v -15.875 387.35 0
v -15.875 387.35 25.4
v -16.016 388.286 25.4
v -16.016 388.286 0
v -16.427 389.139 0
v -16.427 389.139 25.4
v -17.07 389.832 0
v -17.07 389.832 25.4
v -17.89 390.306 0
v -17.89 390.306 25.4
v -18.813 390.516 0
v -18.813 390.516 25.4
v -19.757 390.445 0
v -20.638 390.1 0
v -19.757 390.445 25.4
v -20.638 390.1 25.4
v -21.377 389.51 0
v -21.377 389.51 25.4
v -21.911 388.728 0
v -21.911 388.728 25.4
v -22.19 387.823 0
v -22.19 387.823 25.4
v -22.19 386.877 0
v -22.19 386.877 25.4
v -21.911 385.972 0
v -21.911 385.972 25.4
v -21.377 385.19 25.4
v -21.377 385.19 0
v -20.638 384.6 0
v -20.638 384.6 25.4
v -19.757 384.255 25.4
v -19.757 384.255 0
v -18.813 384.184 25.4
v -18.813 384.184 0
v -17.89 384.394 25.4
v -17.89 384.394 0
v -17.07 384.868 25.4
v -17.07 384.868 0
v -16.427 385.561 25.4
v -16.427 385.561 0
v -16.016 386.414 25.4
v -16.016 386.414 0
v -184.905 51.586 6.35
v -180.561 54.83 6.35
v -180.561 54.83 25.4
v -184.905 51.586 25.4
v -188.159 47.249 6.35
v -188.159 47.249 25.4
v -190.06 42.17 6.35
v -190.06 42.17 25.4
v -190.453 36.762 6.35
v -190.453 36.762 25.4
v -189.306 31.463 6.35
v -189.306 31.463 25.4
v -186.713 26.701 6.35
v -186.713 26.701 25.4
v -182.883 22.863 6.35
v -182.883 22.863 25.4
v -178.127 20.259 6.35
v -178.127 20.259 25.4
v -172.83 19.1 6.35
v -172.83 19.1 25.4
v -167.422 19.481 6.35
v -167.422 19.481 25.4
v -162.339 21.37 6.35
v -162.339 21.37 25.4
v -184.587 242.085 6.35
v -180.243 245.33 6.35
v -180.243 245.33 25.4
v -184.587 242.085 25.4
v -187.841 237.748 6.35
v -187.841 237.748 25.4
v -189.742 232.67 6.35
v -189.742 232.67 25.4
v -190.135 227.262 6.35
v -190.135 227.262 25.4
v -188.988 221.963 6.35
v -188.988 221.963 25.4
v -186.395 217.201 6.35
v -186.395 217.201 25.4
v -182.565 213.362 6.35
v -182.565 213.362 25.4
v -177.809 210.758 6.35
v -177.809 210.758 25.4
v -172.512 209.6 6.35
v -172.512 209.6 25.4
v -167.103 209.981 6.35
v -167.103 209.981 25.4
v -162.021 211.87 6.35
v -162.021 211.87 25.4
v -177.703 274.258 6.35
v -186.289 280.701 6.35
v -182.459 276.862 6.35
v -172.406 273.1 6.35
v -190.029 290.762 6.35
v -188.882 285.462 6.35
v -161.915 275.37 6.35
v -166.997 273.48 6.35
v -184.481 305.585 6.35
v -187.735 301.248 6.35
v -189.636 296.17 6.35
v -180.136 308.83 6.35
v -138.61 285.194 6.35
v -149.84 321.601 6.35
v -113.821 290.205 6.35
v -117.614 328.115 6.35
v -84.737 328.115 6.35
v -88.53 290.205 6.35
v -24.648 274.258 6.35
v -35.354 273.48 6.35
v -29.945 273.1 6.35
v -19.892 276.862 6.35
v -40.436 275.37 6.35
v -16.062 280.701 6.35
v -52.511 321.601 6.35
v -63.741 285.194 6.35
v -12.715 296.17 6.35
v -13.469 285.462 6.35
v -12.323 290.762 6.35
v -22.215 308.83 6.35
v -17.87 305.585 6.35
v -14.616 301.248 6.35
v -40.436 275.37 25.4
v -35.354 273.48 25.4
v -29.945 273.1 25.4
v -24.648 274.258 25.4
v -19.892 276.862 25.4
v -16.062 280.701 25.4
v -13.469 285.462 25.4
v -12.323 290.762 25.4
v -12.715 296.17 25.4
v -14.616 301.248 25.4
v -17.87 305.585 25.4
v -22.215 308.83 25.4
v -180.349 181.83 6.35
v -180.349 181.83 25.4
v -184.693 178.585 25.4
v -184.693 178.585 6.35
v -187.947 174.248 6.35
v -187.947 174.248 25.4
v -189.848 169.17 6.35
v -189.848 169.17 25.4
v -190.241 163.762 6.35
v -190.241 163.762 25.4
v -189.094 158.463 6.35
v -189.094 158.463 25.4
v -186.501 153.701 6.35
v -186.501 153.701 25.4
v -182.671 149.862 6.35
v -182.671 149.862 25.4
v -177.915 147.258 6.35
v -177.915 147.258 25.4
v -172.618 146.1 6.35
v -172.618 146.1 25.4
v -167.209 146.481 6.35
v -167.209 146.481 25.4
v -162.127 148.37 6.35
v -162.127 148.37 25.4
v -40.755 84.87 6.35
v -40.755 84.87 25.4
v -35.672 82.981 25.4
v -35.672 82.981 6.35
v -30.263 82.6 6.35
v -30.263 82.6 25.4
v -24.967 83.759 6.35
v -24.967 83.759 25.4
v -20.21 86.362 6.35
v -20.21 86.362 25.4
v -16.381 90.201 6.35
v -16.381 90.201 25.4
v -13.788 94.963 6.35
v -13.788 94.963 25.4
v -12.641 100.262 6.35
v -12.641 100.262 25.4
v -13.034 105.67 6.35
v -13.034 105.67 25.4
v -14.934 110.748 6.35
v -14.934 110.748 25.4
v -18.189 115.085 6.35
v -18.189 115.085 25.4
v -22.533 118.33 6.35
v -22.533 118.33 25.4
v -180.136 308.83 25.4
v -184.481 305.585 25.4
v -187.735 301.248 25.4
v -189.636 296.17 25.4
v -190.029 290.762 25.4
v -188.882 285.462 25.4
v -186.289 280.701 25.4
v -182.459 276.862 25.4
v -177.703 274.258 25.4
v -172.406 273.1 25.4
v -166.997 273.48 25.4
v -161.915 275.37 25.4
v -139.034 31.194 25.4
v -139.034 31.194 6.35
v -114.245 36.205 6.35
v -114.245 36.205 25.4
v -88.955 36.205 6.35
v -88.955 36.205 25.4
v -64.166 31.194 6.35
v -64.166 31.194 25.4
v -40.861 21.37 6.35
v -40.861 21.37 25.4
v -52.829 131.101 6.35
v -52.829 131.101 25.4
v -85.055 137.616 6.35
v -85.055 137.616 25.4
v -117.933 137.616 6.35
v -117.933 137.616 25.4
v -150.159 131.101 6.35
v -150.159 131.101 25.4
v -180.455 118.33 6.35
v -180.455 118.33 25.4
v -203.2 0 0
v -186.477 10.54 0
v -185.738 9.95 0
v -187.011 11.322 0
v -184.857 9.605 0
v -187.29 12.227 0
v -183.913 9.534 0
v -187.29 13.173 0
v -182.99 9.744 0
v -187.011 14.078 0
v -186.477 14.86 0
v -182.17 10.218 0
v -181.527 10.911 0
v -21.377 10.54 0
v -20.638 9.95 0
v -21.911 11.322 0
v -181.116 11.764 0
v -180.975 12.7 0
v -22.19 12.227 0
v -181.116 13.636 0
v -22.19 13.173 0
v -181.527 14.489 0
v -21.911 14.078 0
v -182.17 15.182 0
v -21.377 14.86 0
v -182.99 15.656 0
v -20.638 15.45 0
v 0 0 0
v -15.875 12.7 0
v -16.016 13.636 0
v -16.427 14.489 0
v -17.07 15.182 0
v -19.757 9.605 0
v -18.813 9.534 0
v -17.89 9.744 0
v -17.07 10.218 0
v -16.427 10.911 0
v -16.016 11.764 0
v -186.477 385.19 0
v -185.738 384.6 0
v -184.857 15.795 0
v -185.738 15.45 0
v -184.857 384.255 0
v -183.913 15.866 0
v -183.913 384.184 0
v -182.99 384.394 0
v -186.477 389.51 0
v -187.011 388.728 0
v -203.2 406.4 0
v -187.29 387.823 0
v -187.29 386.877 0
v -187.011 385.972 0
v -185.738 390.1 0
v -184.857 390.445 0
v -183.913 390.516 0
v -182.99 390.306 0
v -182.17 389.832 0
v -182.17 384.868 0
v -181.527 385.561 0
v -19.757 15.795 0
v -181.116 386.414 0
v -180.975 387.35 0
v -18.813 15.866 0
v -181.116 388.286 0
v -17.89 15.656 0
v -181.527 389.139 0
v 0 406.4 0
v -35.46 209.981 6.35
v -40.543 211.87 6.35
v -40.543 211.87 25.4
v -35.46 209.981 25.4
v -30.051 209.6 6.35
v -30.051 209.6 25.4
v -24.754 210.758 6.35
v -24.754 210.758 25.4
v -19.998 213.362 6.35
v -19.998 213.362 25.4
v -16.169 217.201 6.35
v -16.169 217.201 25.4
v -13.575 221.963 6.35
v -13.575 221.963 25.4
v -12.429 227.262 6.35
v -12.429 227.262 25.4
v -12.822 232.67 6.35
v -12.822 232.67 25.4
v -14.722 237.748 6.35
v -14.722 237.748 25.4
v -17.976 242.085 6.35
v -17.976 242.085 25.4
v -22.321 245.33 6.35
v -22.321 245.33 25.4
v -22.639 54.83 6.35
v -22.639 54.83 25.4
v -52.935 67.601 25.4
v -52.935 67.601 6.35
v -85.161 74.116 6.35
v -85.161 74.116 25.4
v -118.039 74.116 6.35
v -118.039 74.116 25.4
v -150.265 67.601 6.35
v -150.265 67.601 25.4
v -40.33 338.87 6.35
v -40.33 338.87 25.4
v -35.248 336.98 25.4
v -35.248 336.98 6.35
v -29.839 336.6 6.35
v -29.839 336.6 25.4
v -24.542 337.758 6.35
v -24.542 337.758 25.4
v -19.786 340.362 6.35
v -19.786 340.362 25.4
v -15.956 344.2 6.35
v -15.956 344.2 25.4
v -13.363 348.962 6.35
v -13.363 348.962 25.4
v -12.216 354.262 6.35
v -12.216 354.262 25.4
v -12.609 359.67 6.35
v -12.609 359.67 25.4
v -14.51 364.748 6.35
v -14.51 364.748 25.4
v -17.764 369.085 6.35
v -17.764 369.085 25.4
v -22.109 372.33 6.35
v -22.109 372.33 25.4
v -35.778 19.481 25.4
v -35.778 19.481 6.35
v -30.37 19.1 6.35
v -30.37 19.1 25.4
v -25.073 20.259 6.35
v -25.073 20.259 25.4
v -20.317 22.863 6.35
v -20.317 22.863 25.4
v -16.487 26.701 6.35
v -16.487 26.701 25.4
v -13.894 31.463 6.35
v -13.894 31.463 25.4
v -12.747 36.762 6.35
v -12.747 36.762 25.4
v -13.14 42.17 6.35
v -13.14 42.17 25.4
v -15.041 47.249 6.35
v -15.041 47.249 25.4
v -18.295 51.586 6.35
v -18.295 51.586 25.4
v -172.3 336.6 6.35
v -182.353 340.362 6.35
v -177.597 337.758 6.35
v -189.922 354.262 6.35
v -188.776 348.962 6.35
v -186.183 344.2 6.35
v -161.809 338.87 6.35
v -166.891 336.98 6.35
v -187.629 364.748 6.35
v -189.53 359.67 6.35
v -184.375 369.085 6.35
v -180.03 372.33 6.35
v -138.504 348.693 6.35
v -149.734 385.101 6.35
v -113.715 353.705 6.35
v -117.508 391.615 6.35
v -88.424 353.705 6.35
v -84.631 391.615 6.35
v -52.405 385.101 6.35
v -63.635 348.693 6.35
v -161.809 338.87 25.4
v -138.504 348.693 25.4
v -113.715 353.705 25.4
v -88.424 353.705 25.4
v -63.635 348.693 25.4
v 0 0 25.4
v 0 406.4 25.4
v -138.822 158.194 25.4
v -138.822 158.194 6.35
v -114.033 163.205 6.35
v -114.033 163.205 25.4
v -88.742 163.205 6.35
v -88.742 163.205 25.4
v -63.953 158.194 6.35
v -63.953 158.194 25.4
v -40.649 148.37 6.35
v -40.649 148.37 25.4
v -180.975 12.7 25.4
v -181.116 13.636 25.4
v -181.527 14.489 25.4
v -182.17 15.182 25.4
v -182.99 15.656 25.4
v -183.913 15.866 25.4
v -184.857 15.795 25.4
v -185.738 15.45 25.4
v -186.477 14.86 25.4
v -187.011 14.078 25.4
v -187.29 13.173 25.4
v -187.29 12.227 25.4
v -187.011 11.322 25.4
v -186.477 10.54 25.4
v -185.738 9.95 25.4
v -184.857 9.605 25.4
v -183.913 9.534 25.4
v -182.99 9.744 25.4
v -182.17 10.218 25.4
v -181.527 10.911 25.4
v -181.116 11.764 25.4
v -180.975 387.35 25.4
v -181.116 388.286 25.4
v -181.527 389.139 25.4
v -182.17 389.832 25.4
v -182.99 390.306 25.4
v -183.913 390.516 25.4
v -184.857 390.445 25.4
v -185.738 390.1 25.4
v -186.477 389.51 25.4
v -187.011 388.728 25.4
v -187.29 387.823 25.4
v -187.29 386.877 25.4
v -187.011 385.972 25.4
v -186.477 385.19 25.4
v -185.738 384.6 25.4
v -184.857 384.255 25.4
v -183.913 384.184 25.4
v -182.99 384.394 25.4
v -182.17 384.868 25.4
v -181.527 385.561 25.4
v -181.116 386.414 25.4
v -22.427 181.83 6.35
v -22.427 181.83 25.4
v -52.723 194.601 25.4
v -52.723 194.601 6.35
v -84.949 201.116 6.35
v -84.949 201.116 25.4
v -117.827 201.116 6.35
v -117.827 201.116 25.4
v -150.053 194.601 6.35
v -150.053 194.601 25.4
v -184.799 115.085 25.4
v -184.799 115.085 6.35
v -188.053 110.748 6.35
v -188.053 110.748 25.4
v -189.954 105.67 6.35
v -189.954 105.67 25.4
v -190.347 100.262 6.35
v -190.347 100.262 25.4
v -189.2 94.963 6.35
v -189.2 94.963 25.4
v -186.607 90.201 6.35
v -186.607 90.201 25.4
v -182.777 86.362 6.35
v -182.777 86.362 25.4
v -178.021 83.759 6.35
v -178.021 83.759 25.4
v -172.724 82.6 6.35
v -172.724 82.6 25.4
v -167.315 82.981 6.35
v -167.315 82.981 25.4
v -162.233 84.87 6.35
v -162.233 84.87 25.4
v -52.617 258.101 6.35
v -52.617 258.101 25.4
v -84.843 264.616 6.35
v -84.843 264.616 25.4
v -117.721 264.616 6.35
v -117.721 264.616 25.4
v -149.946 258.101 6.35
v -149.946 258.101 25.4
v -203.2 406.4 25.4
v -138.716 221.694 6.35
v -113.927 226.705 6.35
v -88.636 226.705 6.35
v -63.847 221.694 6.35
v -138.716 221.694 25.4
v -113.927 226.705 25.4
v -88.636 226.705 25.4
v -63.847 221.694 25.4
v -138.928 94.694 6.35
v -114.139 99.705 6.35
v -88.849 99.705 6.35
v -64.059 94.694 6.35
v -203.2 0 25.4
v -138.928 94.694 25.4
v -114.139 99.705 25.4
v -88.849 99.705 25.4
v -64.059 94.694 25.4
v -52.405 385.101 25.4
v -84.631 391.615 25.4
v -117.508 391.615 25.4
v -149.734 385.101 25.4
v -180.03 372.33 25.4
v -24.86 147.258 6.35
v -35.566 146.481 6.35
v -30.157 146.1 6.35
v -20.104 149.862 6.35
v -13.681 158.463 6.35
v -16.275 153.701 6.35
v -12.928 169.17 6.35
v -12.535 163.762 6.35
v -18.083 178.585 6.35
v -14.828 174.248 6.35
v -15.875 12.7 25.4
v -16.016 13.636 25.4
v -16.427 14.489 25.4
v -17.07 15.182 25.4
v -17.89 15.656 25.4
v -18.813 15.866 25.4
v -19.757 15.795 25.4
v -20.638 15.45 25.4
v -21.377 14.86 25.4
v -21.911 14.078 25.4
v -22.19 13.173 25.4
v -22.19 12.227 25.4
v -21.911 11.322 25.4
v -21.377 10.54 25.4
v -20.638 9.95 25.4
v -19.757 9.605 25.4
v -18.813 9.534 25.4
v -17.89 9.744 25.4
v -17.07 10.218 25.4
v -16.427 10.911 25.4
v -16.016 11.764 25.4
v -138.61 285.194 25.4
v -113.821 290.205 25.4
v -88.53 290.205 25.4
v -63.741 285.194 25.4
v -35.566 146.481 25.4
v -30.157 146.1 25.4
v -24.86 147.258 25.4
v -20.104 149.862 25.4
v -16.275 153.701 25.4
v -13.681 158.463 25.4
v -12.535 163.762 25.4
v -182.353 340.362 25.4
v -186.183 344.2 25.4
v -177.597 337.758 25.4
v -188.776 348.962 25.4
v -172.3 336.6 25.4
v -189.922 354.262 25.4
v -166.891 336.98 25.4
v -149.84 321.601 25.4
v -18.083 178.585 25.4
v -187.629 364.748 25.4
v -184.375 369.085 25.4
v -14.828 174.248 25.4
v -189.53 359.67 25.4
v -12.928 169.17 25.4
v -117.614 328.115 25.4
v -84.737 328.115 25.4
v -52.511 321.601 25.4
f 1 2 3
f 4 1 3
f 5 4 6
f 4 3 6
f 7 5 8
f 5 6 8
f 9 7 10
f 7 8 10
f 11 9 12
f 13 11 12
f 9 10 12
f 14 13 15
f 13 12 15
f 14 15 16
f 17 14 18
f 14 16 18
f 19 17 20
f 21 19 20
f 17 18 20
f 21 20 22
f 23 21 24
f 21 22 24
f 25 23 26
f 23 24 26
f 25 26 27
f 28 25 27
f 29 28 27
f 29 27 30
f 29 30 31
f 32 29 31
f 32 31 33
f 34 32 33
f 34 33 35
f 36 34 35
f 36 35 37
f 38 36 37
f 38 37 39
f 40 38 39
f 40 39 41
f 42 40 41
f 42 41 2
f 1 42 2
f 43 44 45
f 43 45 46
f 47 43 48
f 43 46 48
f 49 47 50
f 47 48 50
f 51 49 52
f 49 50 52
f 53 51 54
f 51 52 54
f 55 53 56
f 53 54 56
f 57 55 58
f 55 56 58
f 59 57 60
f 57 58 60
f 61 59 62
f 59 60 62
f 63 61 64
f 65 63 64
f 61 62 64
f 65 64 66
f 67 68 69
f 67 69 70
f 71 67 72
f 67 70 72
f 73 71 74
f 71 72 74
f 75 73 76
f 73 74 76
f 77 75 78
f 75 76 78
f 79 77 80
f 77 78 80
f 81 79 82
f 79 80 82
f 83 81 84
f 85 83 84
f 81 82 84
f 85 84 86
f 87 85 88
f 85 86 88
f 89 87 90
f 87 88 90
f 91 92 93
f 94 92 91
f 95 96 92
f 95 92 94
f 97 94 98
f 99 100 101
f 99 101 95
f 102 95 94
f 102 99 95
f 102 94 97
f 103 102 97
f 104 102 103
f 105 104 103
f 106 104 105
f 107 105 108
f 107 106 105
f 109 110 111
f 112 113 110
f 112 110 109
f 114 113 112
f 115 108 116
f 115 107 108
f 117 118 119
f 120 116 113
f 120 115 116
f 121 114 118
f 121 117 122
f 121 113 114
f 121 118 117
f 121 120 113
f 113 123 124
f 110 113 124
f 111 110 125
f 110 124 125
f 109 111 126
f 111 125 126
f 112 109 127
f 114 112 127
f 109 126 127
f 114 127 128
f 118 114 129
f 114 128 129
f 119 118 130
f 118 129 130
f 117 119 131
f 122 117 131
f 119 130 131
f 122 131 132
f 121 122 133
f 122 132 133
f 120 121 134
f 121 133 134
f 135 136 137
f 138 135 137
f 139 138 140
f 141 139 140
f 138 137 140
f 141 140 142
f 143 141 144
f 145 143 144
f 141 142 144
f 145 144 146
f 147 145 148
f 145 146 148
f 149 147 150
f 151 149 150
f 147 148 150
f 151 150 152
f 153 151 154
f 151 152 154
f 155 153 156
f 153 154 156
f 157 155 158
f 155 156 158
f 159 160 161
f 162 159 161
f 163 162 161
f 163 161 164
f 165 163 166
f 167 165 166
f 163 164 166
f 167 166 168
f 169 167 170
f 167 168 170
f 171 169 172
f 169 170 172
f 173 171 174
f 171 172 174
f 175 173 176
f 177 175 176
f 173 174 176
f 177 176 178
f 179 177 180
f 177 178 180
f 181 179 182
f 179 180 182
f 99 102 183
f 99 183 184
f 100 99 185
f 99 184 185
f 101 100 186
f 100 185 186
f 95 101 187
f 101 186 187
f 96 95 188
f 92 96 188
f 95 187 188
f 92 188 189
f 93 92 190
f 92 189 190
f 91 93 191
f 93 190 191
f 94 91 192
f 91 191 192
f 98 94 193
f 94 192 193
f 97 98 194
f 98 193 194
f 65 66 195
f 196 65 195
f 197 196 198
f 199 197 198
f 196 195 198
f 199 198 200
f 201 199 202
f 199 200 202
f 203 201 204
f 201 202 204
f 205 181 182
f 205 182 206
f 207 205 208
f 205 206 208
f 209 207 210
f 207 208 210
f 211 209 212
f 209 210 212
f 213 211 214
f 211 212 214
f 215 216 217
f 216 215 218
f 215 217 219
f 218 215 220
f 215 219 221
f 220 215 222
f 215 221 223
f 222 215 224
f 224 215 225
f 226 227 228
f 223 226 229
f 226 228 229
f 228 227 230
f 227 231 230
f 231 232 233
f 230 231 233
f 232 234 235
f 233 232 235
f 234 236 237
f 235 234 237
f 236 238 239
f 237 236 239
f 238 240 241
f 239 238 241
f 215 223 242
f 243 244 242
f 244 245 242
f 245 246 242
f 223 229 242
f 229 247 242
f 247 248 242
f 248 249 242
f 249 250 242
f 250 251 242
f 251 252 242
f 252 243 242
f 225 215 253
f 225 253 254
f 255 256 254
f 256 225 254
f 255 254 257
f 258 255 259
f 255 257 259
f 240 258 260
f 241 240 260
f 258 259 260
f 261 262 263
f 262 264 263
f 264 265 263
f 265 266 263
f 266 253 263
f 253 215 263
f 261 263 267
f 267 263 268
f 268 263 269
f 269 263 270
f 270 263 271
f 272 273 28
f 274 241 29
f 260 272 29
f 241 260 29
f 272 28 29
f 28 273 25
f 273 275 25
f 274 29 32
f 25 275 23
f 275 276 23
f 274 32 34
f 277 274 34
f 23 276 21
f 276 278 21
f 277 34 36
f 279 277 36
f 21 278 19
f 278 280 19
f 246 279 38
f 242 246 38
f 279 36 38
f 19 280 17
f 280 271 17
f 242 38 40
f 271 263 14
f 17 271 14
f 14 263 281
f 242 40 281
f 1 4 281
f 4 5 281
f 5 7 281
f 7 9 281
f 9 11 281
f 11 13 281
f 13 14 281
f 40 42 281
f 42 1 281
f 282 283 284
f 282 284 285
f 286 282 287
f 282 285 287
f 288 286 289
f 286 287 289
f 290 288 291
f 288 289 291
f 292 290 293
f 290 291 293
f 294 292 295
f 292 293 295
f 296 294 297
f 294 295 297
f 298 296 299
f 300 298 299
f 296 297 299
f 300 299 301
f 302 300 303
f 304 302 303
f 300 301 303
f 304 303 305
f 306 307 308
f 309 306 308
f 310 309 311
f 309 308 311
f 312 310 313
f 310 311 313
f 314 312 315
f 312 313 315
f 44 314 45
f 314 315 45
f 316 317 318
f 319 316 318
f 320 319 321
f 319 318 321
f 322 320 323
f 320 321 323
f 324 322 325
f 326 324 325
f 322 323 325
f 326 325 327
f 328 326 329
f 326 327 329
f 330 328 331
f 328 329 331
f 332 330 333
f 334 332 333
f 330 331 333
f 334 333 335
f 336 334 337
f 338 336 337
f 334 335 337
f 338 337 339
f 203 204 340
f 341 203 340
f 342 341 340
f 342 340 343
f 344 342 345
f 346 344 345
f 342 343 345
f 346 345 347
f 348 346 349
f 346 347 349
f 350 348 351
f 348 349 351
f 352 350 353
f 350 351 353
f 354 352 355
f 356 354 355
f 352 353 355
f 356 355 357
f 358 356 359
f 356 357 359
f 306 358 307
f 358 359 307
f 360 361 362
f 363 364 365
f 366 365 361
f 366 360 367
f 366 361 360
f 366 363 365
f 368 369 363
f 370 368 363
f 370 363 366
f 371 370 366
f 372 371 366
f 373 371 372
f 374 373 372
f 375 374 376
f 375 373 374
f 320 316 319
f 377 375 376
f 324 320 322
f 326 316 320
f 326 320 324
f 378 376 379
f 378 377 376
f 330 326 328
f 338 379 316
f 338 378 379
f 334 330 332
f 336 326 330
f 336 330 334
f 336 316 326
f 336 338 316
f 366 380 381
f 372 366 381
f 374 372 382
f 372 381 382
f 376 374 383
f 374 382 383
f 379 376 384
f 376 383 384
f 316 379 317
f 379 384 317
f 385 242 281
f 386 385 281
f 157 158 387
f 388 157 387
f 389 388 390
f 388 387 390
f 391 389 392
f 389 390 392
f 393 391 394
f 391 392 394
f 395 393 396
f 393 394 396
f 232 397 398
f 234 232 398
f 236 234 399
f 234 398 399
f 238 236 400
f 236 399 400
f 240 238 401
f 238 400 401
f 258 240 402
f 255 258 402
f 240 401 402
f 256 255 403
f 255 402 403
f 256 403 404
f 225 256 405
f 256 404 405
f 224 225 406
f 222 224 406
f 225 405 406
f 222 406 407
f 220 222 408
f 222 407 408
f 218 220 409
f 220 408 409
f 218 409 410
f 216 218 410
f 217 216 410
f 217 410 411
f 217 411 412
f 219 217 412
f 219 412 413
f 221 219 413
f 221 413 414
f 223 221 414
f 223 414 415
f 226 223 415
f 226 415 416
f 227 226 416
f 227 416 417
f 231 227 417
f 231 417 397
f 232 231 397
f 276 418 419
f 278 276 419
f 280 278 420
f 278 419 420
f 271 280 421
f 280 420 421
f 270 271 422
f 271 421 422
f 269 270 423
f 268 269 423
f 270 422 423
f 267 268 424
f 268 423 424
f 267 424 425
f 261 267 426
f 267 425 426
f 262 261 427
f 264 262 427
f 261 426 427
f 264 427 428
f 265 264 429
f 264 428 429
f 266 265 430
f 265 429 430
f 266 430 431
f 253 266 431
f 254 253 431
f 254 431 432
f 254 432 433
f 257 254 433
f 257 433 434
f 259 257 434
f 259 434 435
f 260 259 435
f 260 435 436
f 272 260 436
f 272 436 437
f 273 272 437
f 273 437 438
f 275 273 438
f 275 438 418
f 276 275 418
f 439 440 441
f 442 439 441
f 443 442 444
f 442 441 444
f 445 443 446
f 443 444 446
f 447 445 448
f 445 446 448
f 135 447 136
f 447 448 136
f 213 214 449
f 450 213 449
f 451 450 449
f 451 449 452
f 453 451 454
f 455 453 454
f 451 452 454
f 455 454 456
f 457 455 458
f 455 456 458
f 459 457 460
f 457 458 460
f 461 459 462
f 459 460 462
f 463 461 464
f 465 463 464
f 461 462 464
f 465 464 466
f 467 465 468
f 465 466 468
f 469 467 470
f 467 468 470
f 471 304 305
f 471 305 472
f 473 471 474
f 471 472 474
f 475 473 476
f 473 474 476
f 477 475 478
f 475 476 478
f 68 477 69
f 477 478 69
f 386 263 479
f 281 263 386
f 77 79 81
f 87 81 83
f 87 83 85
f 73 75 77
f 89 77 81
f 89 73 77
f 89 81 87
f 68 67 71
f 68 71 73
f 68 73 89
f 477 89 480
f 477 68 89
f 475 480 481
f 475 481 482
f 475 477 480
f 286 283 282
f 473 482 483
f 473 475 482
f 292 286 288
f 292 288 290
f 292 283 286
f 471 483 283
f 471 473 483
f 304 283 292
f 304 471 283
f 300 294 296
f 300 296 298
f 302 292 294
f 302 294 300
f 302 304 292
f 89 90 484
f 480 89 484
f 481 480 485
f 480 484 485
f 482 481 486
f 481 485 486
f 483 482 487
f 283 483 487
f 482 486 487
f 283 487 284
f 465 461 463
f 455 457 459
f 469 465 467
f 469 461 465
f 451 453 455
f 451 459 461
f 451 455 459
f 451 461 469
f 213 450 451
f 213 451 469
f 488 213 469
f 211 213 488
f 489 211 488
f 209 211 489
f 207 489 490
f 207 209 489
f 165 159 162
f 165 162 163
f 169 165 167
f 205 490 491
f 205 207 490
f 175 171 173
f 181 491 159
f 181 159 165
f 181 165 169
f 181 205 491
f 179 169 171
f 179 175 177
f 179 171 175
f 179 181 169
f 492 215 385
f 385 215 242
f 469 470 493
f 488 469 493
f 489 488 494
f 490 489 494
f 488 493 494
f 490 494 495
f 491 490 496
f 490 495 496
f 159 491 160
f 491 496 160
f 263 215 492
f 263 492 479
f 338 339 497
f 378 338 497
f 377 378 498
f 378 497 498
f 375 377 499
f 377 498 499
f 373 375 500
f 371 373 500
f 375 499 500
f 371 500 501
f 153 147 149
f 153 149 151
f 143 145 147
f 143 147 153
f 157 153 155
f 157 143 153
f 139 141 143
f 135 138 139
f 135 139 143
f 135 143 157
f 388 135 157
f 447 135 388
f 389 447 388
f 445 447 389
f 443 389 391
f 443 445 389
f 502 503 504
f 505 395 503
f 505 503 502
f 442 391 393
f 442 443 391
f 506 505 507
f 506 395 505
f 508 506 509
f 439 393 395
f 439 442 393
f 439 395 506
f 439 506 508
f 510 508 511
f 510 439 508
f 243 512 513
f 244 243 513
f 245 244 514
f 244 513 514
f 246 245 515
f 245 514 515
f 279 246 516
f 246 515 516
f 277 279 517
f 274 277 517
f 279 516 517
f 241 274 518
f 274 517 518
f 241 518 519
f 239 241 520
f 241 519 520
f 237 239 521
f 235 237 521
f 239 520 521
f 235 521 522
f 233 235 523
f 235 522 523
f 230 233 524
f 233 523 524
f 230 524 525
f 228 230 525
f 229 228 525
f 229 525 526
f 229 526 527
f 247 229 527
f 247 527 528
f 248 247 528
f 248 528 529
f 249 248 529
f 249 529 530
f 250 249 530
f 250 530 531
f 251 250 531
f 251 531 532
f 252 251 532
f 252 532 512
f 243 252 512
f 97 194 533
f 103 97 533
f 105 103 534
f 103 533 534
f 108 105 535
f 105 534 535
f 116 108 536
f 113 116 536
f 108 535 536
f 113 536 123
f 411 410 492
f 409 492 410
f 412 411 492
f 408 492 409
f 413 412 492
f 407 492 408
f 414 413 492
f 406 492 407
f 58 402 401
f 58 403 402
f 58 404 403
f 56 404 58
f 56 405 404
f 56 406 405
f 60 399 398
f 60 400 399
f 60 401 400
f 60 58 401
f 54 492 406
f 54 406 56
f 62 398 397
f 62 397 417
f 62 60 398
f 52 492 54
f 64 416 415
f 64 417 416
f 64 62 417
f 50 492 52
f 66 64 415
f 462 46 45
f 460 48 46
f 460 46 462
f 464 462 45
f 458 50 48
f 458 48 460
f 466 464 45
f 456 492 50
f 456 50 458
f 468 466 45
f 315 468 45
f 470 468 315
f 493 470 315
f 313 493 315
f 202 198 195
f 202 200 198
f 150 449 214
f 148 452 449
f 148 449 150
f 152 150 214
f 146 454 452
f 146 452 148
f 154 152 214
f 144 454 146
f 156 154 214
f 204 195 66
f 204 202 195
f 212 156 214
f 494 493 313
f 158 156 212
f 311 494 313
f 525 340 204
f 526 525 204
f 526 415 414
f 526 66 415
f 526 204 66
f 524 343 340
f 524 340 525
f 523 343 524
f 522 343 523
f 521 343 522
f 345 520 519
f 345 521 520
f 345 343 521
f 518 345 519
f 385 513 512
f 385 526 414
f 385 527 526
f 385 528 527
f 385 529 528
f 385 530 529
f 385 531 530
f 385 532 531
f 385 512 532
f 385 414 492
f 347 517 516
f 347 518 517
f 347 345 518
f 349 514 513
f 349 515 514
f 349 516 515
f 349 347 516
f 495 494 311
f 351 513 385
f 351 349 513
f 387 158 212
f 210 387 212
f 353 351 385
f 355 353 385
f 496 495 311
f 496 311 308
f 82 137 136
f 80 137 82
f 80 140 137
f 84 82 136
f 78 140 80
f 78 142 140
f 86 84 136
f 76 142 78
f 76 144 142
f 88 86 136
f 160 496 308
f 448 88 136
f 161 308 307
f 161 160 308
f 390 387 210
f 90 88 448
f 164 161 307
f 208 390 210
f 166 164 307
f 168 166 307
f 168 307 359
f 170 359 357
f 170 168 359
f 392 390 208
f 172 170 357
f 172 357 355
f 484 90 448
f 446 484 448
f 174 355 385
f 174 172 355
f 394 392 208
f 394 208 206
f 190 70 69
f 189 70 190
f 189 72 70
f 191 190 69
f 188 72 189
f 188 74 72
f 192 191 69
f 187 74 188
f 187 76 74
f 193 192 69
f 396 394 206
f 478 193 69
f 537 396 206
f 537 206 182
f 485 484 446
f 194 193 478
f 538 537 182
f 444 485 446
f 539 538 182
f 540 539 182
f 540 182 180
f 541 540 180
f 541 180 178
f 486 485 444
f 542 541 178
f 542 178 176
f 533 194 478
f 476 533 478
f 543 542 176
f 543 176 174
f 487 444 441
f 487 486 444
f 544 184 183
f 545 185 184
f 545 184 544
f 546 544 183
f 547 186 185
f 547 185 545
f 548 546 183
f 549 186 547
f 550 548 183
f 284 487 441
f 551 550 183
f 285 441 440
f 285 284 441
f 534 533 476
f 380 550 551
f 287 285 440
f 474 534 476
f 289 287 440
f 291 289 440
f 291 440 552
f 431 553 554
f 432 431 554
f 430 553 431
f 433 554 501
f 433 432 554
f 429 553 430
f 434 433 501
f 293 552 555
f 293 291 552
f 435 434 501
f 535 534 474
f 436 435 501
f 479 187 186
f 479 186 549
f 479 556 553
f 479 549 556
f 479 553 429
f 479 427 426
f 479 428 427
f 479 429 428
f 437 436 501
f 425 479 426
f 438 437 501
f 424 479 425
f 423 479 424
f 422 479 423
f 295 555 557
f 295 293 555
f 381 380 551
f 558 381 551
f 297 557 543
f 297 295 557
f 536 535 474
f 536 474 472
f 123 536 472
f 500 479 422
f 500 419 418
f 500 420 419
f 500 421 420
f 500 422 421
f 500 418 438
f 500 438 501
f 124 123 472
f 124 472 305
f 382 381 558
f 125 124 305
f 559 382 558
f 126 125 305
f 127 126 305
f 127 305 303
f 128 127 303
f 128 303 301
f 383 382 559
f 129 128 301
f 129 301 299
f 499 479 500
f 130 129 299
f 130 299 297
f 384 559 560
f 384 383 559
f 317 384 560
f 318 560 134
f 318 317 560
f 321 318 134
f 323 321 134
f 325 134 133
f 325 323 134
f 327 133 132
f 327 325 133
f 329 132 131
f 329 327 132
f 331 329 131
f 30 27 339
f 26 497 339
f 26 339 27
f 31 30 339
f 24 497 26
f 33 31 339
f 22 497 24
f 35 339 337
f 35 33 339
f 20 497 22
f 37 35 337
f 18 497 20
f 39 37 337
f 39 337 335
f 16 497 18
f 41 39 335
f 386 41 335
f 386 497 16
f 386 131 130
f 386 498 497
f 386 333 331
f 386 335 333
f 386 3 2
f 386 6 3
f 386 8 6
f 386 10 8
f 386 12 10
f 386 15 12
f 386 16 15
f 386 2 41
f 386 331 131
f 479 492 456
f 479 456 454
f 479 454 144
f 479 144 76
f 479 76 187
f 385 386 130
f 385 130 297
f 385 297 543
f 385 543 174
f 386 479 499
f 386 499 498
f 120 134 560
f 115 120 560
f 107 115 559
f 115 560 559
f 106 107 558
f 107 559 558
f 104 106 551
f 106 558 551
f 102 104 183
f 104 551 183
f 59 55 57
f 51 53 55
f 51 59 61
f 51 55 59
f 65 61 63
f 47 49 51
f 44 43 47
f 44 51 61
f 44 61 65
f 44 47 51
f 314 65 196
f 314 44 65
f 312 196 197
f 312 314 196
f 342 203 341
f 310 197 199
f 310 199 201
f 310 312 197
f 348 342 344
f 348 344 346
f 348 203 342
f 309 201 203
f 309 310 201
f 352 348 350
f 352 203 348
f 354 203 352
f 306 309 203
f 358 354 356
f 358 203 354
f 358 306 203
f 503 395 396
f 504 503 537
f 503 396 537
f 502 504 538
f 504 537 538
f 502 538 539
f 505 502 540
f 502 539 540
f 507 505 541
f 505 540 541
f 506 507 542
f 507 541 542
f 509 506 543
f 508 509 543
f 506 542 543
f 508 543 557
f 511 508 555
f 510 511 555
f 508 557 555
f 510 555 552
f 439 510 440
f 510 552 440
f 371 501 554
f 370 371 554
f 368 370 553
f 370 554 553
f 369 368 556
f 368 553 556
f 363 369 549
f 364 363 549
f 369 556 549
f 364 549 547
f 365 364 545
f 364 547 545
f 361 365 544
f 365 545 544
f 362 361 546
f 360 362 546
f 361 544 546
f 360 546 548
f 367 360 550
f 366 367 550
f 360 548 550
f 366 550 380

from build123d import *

# Parameters (mm, degrees)
F0_W     = 203.2
F0_H     = 406.4
F1_DEPTH = 25.4
F3_DEPTH = 19.05
F4_R     = 3.175
F5_DEPTH = 25.401


with BuildPart() as f1:
    # F0 (on Top) → F1 (new body)
    with BuildSketch(Plane.XY):
        with Locations((-101.6, 203.2)):
            Rectangle(F0_W, F0_H)
    extrude(amount=F1_DEPTH)

    # F2 (on face) → F3 (cut)
    with BuildSketch(Plane.XY.offset(25.4)):
        with BuildLine():
            ThreePointArc((-162.33913, 21.369951), (-101.6, 36.836287), (-40.86087, 21.369951))
            ThreePointArc((-40.86087, 21.369951), (-15.019951, 28.98913), (-22.63913, 54.830049))
            ThreePointArc((-22.63913, 54.830049), (-101.6, 74.936287), (-180.56087, 54.830049))
            ThreePointArc((-180.56087, 54.830049), (-188.180049, 28.98913), (-162.33913, 21.369951))
        make_face()
        with BuildLine():
            ThreePointArc((-162.233016, 84.869862), (-101.493885, 100.336199), (-40.754755, 84.869862))
            ThreePointArc((-40.754755, 84.869862), (-14.913836, 92.489042), (-22.533016, 118.329961))
            ThreePointArc((-22.533016, 118.329961), (-101.493885, 138.436199), (-180.454755, 118.329961))
            ThreePointArc((-180.454755, 118.329961), (-188.073935, 92.489042), (-162.233016, 84.869862))
        make_face()
        with BuildLine():
            ThreePointArc((-162.126901, 148.369773), (-101.387771, 163.83611), (-40.64864, 148.369773))
            ThreePointArc((-40.64864, 148.369773), (-14.807721, 155.988953), (-22.426901, 181.829872))
            ThreePointArc((-22.426901, 181.829872), (-101.387771, 201.93611), (-180.34864, 181.829872))
            ThreePointArc((-180.34864, 181.829872), (-187.96782, 155.988953), (-162.126901, 148.369773))
        make_face()
        with BuildLine():
            ThreePointArc((-162.020787, 211.869685), (-101.281656, 227.336021), (-40.542526, 211.869685))
            ThreePointArc((-40.542526, 211.869685), (-14.701607, 219.488864), (-22.320787, 245.329783))
            ThreePointArc((-22.320787, 245.329783), (-101.281656, 265.436021), (-180.242526, 245.329783))
            ThreePointArc((-180.242526, 245.329783), (-187.861706, 219.488864), (-162.020787, 211.869685))
        make_face()
        with BuildLine():
            ThreePointArc((-161.914672, 275.369596), (-101.175541, 290.835933), (-40.436411, 275.369596))
            ThreePointArc((-40.436411, 275.369596), (-14.595492, 282.988776), (-22.214672, 308.829695))
            ThreePointArc((-22.214672, 308.829695), (-101.175541, 328.935933), (-180.136411, 308.829695))
            ThreePointArc((-180.136411, 308.829695), (-187.755591, 282.988776), (-161.914672, 275.369596))
        make_face()
        with BuildLine():
            ThreePointArc((-161.808557, 338.869507), (-101.069427, 354.335844), (-40.330296, 338.869507))
            ThreePointArc((-40.330296, 338.869507), (-14.489377, 346.488687), (-22.108557, 372.329606))
            ThreePointArc((-22.108557, 372.329606), (-101.069427, 392.435844), (-180.030296, 372.329606))
            ThreePointArc((-180.030296, 372.329606), (-187.649476, 346.488687), (-161.808557, 338.869507))
        make_face()
    extrude(amount=-F3_DEPTH, mode=Mode.SUBTRACT)

    # F4 (on face) → F5 (cut, through all)
    with BuildSketch(Plane.XY.offset(25.4)):
        with Locations((-184.15, 387.35)):
            Circle(F4_R)
        with Locations((-19.05, 387.35)):
            Circle(F4_R)
        with Locations((-184.15, 12.7)):
            Circle(F4_R)
        with Locations((-19.05, 12.7)):
            Circle(F4_R)
    extrude(amount=-F5_DEPTH, mode=Mode.SUBTRACT)


solid = f1.part
